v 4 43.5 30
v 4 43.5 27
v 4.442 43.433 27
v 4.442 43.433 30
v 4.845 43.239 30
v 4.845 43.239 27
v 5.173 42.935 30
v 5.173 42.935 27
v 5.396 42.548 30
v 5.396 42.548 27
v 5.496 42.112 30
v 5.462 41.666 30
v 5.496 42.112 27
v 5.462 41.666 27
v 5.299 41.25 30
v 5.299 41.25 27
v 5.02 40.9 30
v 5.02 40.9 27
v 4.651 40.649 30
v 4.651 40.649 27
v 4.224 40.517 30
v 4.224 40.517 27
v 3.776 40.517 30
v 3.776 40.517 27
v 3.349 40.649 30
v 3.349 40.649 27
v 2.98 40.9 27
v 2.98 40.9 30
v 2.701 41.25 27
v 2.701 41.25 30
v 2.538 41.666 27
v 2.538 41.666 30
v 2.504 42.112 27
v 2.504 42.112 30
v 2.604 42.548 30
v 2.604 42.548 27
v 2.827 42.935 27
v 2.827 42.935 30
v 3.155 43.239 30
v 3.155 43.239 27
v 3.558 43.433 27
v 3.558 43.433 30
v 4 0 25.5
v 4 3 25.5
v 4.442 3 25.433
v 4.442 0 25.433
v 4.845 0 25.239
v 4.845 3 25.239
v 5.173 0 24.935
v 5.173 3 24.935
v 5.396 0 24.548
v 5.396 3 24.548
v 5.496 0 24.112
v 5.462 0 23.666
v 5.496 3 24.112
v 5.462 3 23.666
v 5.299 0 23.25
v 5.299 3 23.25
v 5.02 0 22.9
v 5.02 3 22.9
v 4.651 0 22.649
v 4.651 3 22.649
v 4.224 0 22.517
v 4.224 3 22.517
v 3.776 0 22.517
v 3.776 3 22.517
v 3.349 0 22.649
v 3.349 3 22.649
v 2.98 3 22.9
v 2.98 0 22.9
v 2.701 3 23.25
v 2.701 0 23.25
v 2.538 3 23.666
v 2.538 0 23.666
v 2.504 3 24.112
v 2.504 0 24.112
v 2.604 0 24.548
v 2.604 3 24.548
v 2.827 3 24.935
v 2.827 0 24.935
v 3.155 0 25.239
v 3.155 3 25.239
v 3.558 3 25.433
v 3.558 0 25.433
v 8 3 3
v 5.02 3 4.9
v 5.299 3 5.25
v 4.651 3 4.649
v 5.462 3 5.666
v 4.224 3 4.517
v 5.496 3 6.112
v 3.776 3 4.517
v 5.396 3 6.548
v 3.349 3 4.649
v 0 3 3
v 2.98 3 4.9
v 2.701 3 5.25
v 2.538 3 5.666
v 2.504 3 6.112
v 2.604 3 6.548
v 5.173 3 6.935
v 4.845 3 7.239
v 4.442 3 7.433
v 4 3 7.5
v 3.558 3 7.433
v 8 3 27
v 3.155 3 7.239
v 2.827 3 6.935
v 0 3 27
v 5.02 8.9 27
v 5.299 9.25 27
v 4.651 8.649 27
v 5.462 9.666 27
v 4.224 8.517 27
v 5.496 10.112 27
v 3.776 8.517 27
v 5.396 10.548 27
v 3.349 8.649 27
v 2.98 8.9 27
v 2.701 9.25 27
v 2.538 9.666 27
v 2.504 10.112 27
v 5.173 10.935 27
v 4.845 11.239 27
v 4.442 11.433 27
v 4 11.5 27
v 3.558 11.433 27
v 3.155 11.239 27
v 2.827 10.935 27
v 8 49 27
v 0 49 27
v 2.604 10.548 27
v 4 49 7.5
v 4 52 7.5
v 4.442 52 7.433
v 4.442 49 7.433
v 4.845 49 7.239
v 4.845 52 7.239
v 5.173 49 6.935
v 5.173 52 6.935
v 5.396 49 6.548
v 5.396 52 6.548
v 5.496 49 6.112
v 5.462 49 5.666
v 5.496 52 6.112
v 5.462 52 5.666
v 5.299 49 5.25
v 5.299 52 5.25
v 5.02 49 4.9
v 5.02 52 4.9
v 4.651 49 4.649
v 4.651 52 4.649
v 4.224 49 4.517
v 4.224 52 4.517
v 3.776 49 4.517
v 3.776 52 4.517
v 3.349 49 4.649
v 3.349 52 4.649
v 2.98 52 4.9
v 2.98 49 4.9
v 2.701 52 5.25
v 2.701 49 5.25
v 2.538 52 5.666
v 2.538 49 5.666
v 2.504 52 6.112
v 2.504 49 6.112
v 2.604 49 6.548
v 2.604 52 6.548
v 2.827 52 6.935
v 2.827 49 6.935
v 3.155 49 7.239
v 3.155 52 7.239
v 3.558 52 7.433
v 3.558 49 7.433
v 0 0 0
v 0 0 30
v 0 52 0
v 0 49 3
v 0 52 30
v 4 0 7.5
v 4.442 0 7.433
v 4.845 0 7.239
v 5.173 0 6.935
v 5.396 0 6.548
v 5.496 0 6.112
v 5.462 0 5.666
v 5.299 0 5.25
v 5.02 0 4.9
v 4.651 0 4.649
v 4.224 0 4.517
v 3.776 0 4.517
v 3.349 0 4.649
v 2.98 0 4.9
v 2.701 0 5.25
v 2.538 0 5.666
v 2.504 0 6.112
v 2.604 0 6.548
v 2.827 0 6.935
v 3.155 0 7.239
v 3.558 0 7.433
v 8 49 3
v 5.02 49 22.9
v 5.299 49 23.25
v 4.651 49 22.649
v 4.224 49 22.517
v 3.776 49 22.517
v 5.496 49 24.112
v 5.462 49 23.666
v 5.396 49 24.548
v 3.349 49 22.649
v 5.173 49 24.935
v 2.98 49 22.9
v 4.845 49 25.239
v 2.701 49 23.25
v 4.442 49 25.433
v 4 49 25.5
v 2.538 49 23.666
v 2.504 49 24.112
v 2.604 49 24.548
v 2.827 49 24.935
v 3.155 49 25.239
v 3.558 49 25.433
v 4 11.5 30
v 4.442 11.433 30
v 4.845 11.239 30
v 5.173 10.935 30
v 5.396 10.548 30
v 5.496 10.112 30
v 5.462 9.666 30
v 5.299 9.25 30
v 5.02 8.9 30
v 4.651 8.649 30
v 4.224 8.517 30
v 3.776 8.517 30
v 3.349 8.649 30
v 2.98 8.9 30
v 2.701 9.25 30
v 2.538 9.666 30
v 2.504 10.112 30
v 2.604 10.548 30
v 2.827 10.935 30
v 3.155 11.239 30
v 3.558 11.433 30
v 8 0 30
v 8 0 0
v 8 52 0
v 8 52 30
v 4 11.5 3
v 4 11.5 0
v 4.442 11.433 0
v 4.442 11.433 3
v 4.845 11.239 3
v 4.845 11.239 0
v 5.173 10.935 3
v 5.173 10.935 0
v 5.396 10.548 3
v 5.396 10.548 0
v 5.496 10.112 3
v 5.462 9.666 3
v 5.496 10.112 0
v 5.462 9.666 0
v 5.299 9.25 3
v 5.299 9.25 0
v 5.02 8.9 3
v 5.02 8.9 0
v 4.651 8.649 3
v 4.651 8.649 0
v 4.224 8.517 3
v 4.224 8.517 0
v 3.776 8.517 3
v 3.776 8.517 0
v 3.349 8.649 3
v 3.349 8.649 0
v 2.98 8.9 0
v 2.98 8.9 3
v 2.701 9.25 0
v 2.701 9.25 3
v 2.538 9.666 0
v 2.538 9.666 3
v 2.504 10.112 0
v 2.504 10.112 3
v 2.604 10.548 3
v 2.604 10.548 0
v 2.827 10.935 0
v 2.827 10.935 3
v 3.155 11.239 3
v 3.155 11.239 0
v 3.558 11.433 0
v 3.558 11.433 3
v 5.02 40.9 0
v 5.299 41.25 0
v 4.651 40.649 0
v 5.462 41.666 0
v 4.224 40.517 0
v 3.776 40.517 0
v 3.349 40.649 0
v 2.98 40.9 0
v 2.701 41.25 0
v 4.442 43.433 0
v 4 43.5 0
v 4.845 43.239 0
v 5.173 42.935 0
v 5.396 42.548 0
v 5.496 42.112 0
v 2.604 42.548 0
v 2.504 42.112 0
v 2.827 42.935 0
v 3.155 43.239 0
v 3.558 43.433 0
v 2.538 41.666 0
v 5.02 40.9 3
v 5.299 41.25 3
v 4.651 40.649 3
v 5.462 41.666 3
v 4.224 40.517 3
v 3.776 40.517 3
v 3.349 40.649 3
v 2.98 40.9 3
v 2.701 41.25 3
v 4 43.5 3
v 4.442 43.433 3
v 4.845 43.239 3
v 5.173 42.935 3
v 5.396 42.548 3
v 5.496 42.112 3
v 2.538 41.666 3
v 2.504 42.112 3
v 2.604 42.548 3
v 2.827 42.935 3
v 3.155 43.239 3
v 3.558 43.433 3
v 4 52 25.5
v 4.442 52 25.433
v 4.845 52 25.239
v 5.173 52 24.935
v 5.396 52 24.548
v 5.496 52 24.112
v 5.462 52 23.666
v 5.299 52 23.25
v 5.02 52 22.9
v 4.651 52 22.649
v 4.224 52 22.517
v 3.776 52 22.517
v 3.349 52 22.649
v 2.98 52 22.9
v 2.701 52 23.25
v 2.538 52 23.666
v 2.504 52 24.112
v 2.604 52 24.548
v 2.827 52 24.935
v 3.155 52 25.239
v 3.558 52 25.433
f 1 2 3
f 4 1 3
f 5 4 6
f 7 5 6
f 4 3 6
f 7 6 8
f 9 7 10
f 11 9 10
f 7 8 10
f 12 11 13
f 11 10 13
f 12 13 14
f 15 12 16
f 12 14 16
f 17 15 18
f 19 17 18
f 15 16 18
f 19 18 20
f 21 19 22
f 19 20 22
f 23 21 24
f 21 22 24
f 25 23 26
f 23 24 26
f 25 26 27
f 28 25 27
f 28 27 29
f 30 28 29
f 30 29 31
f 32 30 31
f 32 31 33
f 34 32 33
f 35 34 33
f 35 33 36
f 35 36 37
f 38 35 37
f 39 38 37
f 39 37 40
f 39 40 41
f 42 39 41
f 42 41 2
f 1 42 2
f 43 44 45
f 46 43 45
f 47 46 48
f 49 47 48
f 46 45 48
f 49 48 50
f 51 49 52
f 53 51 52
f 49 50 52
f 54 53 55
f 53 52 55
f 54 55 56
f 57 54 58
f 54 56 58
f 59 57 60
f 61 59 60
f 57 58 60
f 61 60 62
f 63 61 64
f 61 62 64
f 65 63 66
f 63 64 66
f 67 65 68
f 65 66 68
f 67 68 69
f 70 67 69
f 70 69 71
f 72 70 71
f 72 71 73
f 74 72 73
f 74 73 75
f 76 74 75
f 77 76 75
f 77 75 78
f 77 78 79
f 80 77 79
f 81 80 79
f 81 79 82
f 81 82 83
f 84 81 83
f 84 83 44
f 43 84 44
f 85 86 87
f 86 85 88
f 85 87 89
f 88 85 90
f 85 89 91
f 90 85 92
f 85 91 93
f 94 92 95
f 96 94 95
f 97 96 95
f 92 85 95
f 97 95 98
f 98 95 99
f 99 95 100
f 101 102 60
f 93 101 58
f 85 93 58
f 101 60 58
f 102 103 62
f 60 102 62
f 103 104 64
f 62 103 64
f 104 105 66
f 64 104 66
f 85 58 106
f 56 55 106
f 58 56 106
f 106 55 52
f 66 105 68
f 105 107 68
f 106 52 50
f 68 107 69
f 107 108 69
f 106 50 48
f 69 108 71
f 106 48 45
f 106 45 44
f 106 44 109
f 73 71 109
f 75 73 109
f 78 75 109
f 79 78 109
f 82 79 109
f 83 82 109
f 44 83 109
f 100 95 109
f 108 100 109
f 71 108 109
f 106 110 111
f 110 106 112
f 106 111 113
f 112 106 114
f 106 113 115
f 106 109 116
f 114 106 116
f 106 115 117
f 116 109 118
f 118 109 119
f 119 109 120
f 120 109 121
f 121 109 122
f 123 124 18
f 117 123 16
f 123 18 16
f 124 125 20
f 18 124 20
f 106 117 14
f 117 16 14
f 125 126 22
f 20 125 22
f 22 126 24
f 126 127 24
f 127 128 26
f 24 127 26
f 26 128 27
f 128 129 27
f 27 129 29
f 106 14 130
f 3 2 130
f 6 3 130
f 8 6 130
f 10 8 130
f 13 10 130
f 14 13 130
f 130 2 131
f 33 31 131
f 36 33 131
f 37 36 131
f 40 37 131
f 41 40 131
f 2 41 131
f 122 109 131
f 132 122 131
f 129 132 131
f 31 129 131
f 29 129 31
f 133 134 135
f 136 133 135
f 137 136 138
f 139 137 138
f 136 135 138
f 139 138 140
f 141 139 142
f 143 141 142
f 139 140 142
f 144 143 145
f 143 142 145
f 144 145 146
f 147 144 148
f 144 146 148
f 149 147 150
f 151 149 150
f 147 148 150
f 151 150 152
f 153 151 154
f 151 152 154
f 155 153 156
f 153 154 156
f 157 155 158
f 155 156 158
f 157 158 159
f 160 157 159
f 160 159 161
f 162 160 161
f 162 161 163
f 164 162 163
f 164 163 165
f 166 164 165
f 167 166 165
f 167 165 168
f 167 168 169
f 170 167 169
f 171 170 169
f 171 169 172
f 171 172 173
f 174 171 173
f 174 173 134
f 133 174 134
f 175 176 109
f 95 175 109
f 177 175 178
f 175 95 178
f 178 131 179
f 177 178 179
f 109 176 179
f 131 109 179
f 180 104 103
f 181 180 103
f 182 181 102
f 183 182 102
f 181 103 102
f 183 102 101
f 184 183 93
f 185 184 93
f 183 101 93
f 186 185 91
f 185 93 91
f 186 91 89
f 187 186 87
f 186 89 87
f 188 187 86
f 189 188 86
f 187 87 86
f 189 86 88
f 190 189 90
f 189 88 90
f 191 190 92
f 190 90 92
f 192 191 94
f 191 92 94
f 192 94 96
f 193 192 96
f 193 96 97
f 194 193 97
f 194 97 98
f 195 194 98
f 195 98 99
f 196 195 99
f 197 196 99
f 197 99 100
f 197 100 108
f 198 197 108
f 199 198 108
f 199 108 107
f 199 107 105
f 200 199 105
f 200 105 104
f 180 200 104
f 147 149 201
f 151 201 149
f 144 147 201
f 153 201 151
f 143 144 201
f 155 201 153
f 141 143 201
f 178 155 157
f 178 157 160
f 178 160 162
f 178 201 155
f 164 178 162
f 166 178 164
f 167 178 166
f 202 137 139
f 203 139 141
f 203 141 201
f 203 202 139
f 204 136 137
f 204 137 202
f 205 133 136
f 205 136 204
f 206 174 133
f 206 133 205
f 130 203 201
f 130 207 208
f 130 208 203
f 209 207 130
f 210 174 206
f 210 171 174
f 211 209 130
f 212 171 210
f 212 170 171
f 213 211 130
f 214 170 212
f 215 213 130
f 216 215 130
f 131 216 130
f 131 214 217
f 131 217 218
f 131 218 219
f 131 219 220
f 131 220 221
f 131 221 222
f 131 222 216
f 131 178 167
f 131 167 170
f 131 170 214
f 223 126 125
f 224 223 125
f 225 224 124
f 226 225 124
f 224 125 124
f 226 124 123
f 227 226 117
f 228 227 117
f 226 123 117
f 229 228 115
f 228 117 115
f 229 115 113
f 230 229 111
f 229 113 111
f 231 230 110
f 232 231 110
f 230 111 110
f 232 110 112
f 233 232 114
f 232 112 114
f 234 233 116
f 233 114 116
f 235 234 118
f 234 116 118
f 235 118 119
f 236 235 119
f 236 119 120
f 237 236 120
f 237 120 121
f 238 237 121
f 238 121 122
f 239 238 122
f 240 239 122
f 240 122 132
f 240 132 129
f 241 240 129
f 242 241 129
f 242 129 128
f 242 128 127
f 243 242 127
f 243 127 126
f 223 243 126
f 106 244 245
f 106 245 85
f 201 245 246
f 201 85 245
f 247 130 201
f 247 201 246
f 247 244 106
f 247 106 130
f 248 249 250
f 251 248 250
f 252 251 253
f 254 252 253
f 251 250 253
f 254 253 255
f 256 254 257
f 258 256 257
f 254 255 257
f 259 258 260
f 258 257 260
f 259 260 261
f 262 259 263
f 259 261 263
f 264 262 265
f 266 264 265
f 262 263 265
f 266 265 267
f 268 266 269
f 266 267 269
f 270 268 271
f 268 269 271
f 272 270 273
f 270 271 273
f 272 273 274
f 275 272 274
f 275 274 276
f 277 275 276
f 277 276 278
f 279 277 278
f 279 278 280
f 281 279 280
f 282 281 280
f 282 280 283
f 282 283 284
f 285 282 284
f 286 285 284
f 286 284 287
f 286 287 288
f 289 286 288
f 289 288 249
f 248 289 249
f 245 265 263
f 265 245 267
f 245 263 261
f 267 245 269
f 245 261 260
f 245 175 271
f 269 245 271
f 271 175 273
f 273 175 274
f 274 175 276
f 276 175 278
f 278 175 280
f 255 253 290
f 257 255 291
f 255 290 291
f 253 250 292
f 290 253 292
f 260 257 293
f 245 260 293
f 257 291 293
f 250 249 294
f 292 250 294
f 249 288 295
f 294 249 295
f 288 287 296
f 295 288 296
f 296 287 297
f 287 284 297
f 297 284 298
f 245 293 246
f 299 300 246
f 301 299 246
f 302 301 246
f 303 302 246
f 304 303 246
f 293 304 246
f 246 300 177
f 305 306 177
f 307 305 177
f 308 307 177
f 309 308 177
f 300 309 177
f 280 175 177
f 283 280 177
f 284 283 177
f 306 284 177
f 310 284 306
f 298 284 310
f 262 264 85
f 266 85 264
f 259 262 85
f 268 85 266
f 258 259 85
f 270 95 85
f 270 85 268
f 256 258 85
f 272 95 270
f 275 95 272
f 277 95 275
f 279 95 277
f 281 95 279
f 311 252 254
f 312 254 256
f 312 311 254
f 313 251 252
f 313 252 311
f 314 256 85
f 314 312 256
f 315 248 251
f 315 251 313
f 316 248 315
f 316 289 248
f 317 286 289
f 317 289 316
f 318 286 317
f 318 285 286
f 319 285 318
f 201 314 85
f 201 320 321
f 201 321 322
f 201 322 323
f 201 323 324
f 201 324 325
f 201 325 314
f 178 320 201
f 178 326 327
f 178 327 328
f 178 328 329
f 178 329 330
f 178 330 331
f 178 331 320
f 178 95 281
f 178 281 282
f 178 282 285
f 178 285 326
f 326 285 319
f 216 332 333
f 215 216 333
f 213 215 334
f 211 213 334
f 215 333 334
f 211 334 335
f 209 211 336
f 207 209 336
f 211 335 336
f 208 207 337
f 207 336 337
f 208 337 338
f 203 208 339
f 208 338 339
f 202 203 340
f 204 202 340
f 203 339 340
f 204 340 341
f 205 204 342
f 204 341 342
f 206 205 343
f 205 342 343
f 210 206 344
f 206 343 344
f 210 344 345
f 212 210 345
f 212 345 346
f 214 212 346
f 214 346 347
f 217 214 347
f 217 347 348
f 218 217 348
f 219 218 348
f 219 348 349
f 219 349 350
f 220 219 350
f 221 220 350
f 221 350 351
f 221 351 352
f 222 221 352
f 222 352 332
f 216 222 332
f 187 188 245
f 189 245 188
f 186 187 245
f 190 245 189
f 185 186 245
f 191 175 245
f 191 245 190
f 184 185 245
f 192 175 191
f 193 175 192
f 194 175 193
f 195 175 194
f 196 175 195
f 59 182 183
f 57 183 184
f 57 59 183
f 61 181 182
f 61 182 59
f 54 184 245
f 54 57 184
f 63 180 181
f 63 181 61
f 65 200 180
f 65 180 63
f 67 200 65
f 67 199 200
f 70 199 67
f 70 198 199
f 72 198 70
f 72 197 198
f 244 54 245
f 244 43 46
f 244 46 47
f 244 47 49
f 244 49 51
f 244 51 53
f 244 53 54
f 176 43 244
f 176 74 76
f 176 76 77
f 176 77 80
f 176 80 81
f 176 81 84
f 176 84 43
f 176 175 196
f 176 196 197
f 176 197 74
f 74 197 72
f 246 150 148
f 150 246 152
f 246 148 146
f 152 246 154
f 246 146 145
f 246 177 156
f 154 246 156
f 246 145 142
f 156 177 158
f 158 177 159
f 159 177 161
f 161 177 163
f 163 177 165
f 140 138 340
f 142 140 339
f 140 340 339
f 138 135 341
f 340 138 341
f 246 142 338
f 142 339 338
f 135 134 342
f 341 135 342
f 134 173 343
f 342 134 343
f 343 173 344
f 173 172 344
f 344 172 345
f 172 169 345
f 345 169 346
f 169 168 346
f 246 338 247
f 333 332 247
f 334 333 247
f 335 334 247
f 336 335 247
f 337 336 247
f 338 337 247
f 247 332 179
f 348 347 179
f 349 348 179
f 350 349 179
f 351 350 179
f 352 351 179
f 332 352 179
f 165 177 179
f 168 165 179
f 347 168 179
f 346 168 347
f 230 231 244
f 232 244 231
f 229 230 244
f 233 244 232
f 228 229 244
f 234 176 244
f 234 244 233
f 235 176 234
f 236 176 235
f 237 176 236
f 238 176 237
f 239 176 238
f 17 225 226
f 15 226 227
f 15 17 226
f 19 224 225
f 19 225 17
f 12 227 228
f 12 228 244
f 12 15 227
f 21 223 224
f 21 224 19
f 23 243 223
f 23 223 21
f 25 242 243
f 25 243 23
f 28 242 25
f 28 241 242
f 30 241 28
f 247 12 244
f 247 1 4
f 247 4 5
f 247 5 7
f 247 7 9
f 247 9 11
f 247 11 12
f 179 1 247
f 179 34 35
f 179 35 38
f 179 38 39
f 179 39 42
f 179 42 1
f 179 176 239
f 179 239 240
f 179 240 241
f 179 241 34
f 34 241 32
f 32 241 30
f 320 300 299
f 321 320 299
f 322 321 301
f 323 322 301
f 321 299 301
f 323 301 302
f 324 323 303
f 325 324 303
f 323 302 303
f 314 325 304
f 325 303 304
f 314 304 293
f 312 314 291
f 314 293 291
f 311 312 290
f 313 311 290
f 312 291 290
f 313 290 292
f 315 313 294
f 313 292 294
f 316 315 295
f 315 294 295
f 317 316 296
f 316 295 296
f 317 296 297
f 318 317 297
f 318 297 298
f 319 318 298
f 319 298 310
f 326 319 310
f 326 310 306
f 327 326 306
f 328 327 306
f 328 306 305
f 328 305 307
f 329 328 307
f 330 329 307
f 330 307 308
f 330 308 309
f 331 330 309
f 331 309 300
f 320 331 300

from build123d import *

# Parameters (mm, degrees)
SKETCH011_W     = 52
SKETCH011_H     = 30
SKETCH011_W_2   = 46
SKETCH011_H_2   = 24
PAD011_DEPTH    = 8
SKETCH012_R     = 1.5
POCKET_DEPTH    = 52.001
SKETCH013_R     = 1.5
POCKET001_DEPTH = 30.001


with BuildPart() as part:
    # Sketch011 → Pad011 (new body)
    with BuildSketch(Plane.YZ):
        with Locations((26, 15)):
            Rectangle(SKETCH011_W, SKETCH011_H)
        with Locations((26, 15)):
            Rectangle(SKETCH011_W_2, SKETCH011_H_2, mode=Mode.SUBTRACT)
    extrude(amount=PAD011_DEPTH)

    # Sketch012 (on Face2 of Pad011) → Pocket (cut, through all)
    with BuildSketch(Plane.ZX.offset(52)):
        with Locations((6, 4)):
            Circle(SKETCH012_R)
        with Locations((24, 4)):
            Circle(SKETCH012_R)
    extrude(amount=-POCKET_DEPTH, mode=Mode.SUBTRACT)

    # Sketch013 (on Face1 of Pocket) → Pocket001 (cut, through all)
    with BuildSketch(Plane.YX):
        with Locations((10, 4)):
            Circle(SKETCH013_R)
        with Locations((42, 4)):
            Circle(SKETCH013_R)
    extrude(amount=-POCKET001_DEPTH, mode=Mode.SUBTRACT)


solid = part.part
